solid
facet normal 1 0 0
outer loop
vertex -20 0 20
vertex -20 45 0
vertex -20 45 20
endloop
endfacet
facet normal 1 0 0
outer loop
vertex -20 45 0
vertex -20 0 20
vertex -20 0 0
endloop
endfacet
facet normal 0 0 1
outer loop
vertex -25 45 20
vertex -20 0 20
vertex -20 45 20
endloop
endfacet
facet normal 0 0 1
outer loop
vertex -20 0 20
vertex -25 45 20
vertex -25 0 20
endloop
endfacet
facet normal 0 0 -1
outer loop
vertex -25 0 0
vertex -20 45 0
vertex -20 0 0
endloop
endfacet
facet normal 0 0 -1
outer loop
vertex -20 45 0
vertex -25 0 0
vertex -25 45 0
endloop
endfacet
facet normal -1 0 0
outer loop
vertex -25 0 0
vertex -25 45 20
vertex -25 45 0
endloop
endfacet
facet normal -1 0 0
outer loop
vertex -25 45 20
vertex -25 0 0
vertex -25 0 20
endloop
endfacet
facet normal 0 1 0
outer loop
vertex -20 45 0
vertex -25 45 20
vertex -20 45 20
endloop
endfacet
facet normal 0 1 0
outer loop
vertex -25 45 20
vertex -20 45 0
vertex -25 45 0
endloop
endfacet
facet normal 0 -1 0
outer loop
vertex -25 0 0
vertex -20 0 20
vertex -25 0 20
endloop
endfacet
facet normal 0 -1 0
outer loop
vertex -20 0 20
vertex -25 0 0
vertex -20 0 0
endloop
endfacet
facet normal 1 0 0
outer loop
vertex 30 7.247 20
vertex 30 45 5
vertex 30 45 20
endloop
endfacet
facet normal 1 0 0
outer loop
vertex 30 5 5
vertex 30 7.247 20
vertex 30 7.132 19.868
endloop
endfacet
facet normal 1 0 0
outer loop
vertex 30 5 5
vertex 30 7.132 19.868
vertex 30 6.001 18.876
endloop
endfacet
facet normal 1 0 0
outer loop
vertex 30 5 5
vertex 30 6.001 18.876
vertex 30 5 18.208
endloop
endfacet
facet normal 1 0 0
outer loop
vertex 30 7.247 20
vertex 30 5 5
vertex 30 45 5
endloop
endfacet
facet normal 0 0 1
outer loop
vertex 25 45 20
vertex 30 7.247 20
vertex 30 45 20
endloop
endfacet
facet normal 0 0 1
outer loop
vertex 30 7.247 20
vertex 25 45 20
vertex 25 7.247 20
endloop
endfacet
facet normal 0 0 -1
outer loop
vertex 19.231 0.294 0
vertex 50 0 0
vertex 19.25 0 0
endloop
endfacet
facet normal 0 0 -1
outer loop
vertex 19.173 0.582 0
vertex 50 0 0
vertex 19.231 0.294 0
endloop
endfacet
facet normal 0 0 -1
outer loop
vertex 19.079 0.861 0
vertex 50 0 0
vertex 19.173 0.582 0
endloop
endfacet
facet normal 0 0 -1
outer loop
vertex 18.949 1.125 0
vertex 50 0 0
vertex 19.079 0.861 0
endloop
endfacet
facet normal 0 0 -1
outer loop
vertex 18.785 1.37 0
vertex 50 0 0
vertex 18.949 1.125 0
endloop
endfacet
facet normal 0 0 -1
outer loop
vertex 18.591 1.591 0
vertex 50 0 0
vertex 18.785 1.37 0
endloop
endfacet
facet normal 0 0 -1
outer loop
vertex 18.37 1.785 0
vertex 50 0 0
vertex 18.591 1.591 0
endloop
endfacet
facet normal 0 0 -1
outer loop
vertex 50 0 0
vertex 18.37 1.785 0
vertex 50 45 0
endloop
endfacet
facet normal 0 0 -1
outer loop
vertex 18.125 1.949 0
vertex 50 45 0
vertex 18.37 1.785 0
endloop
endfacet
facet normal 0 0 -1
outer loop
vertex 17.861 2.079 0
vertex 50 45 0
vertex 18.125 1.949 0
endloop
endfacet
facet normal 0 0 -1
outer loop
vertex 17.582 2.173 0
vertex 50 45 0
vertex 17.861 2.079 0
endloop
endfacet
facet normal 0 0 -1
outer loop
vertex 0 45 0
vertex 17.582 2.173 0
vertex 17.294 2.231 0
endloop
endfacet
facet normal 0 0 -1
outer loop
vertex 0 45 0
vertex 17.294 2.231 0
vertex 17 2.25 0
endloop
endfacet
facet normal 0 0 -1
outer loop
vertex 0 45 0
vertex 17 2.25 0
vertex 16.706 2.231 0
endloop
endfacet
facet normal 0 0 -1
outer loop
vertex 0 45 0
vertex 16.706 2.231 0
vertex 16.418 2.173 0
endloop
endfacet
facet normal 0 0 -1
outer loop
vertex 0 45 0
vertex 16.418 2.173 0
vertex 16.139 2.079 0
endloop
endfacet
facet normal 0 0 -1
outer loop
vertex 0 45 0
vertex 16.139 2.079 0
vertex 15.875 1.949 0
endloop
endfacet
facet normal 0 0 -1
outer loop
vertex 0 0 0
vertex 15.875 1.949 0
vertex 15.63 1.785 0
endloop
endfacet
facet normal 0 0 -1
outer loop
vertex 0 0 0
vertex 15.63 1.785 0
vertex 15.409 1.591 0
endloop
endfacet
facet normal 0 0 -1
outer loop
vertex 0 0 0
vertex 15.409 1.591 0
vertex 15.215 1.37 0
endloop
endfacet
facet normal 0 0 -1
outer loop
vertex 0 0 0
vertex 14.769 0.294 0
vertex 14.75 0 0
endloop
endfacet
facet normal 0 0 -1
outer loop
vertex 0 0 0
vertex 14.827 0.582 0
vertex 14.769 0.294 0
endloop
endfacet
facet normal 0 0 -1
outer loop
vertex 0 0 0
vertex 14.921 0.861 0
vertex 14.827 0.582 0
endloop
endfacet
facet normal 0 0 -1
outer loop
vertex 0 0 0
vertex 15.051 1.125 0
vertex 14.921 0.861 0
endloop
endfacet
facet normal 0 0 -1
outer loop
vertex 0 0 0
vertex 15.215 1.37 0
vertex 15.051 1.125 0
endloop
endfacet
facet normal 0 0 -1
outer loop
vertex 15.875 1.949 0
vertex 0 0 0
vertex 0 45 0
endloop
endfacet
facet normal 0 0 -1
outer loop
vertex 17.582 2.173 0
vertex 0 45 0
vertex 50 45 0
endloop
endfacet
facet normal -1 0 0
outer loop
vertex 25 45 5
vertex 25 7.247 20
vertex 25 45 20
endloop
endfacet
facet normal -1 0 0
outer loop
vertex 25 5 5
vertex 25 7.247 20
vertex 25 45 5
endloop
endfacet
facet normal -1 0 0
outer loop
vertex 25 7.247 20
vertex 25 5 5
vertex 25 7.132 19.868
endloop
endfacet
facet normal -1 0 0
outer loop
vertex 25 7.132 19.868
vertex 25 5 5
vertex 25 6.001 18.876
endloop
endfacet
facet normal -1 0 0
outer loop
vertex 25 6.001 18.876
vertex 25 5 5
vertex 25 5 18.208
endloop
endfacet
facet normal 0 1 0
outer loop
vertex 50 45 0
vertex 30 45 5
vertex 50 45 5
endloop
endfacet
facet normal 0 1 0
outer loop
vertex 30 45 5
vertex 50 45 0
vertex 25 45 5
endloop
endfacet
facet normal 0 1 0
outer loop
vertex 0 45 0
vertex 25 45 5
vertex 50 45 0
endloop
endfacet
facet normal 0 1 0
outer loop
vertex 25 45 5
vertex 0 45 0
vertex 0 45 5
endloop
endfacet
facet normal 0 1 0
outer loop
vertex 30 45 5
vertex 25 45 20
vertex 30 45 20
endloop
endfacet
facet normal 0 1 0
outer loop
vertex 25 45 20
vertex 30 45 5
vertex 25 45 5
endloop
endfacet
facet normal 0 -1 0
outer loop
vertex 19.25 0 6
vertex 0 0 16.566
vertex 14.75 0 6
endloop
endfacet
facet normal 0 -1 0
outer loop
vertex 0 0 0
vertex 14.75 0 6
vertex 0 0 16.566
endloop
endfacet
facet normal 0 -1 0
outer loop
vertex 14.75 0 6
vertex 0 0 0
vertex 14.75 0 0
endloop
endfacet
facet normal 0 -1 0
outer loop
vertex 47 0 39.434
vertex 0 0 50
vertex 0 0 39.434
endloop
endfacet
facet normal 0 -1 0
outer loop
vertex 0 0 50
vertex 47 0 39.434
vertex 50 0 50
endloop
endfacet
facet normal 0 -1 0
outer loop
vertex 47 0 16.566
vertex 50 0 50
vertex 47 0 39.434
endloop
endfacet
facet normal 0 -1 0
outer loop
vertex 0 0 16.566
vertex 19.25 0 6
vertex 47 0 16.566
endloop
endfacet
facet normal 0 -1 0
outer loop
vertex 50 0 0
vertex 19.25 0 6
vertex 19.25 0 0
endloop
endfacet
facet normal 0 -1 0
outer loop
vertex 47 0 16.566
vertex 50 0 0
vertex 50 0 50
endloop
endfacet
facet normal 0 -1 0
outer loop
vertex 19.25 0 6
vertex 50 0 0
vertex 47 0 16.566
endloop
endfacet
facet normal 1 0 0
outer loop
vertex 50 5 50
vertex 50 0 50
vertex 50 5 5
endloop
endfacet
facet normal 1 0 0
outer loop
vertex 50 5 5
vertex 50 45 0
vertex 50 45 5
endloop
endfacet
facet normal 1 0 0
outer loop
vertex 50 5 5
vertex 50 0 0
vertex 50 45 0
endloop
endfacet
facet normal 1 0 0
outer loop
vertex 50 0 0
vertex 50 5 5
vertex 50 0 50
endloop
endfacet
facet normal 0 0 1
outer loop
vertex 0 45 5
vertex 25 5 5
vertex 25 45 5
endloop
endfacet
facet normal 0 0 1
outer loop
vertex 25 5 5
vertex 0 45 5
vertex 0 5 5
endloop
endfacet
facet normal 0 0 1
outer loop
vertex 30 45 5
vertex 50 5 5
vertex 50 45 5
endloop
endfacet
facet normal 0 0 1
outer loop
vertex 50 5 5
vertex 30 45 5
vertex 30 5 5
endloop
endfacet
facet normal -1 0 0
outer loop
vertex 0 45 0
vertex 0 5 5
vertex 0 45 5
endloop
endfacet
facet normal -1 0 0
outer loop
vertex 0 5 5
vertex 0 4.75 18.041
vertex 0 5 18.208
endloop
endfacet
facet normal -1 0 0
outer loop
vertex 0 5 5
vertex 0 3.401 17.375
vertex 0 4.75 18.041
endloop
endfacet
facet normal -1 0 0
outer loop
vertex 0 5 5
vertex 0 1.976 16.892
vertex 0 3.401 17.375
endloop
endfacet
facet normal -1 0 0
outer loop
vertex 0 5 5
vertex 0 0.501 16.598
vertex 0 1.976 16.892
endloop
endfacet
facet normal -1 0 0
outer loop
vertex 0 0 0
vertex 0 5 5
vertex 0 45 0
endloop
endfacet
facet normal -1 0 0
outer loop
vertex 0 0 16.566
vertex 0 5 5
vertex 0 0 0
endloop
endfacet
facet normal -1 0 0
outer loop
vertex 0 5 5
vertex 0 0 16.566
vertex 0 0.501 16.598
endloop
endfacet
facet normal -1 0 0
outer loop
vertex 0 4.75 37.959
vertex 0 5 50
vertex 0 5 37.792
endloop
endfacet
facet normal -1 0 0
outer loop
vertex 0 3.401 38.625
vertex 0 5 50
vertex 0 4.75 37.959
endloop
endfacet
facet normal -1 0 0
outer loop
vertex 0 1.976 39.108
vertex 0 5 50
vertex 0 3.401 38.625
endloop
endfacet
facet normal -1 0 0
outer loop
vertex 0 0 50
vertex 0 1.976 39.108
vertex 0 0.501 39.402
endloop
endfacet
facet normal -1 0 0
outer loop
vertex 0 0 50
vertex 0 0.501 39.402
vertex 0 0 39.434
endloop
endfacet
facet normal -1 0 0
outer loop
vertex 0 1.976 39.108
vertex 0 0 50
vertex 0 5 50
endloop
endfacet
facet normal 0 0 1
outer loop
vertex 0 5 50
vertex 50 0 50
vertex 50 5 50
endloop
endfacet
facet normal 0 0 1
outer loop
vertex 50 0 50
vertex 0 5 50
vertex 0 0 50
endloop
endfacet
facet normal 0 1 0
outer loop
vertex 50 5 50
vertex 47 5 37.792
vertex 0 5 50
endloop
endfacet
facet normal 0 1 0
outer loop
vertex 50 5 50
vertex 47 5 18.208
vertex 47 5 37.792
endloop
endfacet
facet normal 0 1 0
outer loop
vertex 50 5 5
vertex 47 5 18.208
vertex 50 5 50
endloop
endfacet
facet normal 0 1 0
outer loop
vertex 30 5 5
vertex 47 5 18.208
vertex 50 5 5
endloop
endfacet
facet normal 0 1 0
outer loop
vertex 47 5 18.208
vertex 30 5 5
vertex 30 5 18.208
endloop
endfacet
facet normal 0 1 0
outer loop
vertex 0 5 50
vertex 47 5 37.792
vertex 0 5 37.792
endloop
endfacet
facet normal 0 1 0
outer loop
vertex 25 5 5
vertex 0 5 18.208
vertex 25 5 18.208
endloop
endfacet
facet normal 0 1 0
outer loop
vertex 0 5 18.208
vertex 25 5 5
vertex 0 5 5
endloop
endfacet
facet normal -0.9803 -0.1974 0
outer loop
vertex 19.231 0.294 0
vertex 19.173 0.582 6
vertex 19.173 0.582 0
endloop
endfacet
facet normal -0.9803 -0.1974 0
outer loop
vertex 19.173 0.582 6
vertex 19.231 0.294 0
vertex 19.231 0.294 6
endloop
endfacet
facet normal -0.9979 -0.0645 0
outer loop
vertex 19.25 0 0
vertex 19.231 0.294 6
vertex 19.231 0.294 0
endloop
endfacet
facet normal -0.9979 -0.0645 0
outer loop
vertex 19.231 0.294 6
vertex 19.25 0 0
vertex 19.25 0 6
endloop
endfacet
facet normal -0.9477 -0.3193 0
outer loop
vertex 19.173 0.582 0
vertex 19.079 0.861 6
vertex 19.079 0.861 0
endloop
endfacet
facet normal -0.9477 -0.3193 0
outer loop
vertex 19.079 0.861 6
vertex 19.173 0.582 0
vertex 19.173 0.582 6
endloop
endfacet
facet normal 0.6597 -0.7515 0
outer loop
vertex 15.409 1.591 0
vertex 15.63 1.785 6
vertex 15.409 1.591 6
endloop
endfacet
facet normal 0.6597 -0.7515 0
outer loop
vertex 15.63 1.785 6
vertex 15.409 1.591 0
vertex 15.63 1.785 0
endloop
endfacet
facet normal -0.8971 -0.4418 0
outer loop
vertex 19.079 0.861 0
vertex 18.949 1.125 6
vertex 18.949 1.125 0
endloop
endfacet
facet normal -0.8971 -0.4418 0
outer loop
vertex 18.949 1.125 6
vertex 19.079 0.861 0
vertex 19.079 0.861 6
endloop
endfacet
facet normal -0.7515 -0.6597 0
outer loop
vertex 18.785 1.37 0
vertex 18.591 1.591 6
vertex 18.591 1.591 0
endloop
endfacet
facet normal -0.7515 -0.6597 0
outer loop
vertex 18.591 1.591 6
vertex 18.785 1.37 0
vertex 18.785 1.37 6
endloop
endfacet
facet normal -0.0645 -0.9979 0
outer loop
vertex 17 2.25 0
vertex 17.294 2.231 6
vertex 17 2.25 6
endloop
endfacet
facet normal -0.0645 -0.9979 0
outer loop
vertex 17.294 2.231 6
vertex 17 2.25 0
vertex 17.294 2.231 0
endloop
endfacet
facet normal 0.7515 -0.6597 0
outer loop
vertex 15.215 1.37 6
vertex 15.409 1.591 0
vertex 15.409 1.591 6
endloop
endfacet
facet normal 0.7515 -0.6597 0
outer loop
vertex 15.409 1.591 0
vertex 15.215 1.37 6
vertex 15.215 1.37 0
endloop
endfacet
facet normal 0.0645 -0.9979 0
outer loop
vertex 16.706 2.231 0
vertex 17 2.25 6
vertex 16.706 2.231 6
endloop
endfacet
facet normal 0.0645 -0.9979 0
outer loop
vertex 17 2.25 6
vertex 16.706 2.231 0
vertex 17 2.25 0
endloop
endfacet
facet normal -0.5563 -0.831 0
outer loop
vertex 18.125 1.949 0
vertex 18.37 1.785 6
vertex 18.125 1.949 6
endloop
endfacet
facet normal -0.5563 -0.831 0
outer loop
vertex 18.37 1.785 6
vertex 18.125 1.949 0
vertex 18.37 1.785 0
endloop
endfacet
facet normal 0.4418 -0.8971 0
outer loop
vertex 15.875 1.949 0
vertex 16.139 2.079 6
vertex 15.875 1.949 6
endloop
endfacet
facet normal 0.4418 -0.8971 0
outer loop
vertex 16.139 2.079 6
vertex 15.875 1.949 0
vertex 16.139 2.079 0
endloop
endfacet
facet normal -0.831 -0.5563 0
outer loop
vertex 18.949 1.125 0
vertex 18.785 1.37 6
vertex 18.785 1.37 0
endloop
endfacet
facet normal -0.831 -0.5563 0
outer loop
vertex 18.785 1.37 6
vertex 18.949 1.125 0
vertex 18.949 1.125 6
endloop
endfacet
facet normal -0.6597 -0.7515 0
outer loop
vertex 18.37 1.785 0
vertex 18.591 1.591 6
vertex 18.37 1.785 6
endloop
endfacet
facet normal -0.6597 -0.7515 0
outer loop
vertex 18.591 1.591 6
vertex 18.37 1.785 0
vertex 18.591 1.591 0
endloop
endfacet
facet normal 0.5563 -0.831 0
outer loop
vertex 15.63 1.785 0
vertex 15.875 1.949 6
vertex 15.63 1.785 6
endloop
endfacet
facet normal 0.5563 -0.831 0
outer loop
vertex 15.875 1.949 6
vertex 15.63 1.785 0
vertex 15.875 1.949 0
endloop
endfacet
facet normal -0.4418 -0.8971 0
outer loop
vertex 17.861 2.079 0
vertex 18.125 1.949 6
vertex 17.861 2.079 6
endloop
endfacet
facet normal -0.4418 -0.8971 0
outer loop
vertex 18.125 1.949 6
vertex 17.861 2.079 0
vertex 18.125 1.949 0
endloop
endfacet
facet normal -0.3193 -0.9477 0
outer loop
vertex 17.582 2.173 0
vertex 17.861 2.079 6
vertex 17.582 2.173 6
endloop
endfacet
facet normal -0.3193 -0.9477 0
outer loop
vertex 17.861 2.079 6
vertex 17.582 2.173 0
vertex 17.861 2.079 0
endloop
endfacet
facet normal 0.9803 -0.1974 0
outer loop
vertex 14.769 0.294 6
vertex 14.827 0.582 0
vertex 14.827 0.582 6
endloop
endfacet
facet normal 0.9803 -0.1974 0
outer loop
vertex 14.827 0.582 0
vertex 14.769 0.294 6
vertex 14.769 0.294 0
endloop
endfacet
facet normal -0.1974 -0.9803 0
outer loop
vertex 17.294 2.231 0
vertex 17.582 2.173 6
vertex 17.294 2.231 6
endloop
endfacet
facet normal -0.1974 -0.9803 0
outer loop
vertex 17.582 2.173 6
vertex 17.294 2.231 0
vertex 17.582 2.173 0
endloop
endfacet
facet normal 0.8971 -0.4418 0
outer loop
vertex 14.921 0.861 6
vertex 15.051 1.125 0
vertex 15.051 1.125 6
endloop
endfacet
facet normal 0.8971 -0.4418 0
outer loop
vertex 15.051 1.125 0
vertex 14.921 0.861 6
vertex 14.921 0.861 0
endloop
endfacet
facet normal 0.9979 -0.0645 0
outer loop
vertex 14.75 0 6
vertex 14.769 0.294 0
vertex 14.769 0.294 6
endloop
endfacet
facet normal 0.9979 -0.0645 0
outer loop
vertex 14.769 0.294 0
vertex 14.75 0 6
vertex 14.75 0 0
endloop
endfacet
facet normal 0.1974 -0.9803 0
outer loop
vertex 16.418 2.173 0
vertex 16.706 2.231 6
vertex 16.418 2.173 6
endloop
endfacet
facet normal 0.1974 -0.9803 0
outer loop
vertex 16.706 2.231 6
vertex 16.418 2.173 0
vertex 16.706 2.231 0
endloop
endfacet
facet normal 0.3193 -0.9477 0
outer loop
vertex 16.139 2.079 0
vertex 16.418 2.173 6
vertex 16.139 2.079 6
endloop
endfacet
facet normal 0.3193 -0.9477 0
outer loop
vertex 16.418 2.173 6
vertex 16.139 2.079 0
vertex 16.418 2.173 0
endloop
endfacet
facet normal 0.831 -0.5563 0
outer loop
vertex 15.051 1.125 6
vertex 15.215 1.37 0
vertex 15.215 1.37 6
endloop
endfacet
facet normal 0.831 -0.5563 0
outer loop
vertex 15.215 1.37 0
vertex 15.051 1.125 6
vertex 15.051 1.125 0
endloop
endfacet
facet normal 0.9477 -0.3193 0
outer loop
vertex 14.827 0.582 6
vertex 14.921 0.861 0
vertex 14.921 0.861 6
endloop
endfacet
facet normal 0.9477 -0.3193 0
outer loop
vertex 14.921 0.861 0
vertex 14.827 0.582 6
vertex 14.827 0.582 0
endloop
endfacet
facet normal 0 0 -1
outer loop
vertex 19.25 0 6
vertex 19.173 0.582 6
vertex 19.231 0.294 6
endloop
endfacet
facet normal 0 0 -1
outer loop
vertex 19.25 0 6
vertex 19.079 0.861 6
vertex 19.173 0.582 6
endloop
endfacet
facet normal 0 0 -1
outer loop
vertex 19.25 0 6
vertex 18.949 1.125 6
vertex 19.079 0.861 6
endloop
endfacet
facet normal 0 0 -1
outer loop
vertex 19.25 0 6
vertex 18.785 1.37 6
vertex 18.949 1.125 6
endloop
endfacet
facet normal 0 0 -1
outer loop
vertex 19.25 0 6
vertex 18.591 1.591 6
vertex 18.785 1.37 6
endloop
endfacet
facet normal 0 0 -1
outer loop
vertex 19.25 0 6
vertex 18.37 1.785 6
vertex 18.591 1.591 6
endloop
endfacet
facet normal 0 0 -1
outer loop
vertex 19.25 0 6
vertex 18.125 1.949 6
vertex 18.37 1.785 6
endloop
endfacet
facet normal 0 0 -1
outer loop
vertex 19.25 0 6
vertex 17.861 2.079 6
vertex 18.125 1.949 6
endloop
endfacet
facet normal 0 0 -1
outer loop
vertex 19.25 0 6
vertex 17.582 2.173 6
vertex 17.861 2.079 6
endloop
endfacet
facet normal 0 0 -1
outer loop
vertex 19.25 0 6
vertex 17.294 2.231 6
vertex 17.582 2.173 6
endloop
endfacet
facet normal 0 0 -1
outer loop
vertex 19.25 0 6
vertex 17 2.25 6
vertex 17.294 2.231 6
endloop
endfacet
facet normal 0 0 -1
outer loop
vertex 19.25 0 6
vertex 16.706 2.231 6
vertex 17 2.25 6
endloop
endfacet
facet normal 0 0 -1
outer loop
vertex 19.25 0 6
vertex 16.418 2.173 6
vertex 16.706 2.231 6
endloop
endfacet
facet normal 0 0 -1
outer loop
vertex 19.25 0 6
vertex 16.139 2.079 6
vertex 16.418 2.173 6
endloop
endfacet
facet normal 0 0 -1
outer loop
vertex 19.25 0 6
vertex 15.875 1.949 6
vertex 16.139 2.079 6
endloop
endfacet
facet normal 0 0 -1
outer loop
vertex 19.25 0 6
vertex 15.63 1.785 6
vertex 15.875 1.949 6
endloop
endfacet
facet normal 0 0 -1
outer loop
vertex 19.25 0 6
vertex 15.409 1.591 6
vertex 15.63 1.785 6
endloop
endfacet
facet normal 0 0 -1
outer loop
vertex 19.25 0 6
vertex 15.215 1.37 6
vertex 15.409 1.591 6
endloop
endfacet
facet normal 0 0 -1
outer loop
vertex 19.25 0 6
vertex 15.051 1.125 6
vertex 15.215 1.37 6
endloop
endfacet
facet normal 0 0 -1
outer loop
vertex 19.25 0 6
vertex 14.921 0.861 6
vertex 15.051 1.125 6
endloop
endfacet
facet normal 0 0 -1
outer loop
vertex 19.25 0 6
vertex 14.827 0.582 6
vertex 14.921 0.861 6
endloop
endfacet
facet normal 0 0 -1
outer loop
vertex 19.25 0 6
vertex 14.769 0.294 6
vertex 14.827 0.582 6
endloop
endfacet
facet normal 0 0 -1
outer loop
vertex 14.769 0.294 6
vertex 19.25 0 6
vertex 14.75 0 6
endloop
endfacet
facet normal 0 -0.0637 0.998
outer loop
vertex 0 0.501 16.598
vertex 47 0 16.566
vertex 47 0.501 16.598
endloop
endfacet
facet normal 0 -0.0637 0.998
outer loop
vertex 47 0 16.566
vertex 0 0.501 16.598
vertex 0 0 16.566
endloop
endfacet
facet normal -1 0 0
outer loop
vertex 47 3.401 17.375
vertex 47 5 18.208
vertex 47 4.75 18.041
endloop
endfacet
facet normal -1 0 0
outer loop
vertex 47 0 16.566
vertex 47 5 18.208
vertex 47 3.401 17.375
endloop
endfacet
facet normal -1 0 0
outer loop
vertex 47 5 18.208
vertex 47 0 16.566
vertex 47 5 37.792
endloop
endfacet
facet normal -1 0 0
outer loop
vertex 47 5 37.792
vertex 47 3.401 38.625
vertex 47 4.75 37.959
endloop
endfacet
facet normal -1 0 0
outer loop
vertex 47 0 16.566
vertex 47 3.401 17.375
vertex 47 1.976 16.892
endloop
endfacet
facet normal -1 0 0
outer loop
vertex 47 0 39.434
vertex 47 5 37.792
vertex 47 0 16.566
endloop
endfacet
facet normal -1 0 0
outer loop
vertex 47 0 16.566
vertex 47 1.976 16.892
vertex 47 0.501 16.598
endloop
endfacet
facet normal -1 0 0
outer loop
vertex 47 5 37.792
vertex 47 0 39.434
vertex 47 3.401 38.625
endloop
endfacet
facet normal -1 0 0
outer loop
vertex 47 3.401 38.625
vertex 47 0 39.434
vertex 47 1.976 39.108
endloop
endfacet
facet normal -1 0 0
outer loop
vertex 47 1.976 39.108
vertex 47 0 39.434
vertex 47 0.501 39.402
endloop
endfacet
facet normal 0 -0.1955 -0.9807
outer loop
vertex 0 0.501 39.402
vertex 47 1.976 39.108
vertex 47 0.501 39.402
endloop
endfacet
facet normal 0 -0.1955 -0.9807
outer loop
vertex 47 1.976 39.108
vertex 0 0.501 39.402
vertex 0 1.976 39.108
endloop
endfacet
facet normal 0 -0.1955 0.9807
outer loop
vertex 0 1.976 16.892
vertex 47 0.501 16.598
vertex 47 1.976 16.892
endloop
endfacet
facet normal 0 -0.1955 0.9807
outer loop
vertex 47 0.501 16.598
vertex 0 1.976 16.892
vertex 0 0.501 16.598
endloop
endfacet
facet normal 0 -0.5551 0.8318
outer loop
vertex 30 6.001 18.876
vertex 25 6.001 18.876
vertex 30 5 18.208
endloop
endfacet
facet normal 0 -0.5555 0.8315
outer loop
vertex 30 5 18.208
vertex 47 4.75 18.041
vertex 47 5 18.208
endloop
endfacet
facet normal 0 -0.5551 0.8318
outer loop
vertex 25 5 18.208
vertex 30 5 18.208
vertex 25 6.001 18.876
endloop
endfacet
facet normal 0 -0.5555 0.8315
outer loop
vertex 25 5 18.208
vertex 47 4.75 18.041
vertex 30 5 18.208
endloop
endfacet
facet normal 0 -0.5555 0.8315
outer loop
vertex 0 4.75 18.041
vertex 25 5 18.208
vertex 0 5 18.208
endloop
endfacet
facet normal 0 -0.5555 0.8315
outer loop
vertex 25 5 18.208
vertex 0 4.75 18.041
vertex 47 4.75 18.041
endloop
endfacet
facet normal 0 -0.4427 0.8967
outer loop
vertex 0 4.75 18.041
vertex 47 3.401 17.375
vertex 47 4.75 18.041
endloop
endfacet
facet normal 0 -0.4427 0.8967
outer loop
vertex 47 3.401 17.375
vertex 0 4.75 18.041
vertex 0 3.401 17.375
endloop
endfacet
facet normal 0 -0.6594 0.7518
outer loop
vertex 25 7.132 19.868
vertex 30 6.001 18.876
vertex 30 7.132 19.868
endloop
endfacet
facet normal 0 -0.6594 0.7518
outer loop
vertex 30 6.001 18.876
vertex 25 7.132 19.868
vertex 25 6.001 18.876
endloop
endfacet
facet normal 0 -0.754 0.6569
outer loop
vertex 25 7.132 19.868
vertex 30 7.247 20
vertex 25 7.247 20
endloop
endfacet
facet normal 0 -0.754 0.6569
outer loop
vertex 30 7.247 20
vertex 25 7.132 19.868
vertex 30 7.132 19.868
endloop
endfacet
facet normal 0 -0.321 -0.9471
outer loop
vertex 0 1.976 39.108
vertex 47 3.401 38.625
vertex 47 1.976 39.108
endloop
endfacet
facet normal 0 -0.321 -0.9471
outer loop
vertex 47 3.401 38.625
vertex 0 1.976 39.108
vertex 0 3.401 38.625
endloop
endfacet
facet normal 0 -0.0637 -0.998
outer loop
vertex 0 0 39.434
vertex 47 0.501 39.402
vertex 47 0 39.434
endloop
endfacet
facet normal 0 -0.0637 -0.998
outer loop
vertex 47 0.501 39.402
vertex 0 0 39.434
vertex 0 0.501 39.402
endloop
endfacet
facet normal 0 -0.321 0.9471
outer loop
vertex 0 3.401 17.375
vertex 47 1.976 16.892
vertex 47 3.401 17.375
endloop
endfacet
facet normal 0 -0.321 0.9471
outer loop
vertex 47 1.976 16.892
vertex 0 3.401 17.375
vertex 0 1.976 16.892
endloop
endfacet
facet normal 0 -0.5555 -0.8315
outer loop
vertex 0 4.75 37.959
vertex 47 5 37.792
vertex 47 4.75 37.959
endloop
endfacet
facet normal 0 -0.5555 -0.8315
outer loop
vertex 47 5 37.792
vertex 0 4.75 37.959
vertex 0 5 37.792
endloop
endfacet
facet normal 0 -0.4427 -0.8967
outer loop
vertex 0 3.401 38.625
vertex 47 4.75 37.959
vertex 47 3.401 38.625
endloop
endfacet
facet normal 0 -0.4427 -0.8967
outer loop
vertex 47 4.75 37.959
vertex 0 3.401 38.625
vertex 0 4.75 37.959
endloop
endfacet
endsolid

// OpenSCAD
// L-shaped mounting bracket - a base plate with two mounting holes and a vertical motor plate with a
// motor boss hole and a screw pattern, reinforced with two triangular gussets. NOVEL general part.
//

base_x   = 50;
base_y   = 45;
base_t   = 5;
tunnel   = 4.5;
plate_h  = 50;
screw_p  = 31;
boss_d   = 23;
gusset_t = 5;

$fn = 48;

g = min(tunnel, screw_p / 2 - 1.5, (boss_d / 2 - 1));        // keep a wall between the boss hole and the screw holes

difference() {
    union() {
        cube([base_x, base_y, base_t]);                 // base plate
        cube([base_x, 5, plate_h]);                     // motor plate (stands on the back edge of the base)
        for (x = [-base_x / 2, base_x / 2])
            translate([x, 0, 0])
                cube([gusset_t, base_y, 20]);           // gussets: right triangles in the YZ plane, right angle at (y=5, z=5)
    }
    translate([-17, 0, -1]) cylinder(h = base_t + 2, d = tunnel);                      // base mounting hole
    translate([17, 0, -1]) cylinder(h = base_t + 2, d = tunnel);
    translate([0, -1, 28]) rotate([0, 90, 0]) cylinder(h = base_y + 2, d = boss_d);   // motor boss hole (along Y)
    for (p = screw_p / 2)
        translate([0, -p, 28]) rotate([0, 90, 0]) cylinder(h = base_y + 2, d = g);    // screw pattern (along Y)
}
